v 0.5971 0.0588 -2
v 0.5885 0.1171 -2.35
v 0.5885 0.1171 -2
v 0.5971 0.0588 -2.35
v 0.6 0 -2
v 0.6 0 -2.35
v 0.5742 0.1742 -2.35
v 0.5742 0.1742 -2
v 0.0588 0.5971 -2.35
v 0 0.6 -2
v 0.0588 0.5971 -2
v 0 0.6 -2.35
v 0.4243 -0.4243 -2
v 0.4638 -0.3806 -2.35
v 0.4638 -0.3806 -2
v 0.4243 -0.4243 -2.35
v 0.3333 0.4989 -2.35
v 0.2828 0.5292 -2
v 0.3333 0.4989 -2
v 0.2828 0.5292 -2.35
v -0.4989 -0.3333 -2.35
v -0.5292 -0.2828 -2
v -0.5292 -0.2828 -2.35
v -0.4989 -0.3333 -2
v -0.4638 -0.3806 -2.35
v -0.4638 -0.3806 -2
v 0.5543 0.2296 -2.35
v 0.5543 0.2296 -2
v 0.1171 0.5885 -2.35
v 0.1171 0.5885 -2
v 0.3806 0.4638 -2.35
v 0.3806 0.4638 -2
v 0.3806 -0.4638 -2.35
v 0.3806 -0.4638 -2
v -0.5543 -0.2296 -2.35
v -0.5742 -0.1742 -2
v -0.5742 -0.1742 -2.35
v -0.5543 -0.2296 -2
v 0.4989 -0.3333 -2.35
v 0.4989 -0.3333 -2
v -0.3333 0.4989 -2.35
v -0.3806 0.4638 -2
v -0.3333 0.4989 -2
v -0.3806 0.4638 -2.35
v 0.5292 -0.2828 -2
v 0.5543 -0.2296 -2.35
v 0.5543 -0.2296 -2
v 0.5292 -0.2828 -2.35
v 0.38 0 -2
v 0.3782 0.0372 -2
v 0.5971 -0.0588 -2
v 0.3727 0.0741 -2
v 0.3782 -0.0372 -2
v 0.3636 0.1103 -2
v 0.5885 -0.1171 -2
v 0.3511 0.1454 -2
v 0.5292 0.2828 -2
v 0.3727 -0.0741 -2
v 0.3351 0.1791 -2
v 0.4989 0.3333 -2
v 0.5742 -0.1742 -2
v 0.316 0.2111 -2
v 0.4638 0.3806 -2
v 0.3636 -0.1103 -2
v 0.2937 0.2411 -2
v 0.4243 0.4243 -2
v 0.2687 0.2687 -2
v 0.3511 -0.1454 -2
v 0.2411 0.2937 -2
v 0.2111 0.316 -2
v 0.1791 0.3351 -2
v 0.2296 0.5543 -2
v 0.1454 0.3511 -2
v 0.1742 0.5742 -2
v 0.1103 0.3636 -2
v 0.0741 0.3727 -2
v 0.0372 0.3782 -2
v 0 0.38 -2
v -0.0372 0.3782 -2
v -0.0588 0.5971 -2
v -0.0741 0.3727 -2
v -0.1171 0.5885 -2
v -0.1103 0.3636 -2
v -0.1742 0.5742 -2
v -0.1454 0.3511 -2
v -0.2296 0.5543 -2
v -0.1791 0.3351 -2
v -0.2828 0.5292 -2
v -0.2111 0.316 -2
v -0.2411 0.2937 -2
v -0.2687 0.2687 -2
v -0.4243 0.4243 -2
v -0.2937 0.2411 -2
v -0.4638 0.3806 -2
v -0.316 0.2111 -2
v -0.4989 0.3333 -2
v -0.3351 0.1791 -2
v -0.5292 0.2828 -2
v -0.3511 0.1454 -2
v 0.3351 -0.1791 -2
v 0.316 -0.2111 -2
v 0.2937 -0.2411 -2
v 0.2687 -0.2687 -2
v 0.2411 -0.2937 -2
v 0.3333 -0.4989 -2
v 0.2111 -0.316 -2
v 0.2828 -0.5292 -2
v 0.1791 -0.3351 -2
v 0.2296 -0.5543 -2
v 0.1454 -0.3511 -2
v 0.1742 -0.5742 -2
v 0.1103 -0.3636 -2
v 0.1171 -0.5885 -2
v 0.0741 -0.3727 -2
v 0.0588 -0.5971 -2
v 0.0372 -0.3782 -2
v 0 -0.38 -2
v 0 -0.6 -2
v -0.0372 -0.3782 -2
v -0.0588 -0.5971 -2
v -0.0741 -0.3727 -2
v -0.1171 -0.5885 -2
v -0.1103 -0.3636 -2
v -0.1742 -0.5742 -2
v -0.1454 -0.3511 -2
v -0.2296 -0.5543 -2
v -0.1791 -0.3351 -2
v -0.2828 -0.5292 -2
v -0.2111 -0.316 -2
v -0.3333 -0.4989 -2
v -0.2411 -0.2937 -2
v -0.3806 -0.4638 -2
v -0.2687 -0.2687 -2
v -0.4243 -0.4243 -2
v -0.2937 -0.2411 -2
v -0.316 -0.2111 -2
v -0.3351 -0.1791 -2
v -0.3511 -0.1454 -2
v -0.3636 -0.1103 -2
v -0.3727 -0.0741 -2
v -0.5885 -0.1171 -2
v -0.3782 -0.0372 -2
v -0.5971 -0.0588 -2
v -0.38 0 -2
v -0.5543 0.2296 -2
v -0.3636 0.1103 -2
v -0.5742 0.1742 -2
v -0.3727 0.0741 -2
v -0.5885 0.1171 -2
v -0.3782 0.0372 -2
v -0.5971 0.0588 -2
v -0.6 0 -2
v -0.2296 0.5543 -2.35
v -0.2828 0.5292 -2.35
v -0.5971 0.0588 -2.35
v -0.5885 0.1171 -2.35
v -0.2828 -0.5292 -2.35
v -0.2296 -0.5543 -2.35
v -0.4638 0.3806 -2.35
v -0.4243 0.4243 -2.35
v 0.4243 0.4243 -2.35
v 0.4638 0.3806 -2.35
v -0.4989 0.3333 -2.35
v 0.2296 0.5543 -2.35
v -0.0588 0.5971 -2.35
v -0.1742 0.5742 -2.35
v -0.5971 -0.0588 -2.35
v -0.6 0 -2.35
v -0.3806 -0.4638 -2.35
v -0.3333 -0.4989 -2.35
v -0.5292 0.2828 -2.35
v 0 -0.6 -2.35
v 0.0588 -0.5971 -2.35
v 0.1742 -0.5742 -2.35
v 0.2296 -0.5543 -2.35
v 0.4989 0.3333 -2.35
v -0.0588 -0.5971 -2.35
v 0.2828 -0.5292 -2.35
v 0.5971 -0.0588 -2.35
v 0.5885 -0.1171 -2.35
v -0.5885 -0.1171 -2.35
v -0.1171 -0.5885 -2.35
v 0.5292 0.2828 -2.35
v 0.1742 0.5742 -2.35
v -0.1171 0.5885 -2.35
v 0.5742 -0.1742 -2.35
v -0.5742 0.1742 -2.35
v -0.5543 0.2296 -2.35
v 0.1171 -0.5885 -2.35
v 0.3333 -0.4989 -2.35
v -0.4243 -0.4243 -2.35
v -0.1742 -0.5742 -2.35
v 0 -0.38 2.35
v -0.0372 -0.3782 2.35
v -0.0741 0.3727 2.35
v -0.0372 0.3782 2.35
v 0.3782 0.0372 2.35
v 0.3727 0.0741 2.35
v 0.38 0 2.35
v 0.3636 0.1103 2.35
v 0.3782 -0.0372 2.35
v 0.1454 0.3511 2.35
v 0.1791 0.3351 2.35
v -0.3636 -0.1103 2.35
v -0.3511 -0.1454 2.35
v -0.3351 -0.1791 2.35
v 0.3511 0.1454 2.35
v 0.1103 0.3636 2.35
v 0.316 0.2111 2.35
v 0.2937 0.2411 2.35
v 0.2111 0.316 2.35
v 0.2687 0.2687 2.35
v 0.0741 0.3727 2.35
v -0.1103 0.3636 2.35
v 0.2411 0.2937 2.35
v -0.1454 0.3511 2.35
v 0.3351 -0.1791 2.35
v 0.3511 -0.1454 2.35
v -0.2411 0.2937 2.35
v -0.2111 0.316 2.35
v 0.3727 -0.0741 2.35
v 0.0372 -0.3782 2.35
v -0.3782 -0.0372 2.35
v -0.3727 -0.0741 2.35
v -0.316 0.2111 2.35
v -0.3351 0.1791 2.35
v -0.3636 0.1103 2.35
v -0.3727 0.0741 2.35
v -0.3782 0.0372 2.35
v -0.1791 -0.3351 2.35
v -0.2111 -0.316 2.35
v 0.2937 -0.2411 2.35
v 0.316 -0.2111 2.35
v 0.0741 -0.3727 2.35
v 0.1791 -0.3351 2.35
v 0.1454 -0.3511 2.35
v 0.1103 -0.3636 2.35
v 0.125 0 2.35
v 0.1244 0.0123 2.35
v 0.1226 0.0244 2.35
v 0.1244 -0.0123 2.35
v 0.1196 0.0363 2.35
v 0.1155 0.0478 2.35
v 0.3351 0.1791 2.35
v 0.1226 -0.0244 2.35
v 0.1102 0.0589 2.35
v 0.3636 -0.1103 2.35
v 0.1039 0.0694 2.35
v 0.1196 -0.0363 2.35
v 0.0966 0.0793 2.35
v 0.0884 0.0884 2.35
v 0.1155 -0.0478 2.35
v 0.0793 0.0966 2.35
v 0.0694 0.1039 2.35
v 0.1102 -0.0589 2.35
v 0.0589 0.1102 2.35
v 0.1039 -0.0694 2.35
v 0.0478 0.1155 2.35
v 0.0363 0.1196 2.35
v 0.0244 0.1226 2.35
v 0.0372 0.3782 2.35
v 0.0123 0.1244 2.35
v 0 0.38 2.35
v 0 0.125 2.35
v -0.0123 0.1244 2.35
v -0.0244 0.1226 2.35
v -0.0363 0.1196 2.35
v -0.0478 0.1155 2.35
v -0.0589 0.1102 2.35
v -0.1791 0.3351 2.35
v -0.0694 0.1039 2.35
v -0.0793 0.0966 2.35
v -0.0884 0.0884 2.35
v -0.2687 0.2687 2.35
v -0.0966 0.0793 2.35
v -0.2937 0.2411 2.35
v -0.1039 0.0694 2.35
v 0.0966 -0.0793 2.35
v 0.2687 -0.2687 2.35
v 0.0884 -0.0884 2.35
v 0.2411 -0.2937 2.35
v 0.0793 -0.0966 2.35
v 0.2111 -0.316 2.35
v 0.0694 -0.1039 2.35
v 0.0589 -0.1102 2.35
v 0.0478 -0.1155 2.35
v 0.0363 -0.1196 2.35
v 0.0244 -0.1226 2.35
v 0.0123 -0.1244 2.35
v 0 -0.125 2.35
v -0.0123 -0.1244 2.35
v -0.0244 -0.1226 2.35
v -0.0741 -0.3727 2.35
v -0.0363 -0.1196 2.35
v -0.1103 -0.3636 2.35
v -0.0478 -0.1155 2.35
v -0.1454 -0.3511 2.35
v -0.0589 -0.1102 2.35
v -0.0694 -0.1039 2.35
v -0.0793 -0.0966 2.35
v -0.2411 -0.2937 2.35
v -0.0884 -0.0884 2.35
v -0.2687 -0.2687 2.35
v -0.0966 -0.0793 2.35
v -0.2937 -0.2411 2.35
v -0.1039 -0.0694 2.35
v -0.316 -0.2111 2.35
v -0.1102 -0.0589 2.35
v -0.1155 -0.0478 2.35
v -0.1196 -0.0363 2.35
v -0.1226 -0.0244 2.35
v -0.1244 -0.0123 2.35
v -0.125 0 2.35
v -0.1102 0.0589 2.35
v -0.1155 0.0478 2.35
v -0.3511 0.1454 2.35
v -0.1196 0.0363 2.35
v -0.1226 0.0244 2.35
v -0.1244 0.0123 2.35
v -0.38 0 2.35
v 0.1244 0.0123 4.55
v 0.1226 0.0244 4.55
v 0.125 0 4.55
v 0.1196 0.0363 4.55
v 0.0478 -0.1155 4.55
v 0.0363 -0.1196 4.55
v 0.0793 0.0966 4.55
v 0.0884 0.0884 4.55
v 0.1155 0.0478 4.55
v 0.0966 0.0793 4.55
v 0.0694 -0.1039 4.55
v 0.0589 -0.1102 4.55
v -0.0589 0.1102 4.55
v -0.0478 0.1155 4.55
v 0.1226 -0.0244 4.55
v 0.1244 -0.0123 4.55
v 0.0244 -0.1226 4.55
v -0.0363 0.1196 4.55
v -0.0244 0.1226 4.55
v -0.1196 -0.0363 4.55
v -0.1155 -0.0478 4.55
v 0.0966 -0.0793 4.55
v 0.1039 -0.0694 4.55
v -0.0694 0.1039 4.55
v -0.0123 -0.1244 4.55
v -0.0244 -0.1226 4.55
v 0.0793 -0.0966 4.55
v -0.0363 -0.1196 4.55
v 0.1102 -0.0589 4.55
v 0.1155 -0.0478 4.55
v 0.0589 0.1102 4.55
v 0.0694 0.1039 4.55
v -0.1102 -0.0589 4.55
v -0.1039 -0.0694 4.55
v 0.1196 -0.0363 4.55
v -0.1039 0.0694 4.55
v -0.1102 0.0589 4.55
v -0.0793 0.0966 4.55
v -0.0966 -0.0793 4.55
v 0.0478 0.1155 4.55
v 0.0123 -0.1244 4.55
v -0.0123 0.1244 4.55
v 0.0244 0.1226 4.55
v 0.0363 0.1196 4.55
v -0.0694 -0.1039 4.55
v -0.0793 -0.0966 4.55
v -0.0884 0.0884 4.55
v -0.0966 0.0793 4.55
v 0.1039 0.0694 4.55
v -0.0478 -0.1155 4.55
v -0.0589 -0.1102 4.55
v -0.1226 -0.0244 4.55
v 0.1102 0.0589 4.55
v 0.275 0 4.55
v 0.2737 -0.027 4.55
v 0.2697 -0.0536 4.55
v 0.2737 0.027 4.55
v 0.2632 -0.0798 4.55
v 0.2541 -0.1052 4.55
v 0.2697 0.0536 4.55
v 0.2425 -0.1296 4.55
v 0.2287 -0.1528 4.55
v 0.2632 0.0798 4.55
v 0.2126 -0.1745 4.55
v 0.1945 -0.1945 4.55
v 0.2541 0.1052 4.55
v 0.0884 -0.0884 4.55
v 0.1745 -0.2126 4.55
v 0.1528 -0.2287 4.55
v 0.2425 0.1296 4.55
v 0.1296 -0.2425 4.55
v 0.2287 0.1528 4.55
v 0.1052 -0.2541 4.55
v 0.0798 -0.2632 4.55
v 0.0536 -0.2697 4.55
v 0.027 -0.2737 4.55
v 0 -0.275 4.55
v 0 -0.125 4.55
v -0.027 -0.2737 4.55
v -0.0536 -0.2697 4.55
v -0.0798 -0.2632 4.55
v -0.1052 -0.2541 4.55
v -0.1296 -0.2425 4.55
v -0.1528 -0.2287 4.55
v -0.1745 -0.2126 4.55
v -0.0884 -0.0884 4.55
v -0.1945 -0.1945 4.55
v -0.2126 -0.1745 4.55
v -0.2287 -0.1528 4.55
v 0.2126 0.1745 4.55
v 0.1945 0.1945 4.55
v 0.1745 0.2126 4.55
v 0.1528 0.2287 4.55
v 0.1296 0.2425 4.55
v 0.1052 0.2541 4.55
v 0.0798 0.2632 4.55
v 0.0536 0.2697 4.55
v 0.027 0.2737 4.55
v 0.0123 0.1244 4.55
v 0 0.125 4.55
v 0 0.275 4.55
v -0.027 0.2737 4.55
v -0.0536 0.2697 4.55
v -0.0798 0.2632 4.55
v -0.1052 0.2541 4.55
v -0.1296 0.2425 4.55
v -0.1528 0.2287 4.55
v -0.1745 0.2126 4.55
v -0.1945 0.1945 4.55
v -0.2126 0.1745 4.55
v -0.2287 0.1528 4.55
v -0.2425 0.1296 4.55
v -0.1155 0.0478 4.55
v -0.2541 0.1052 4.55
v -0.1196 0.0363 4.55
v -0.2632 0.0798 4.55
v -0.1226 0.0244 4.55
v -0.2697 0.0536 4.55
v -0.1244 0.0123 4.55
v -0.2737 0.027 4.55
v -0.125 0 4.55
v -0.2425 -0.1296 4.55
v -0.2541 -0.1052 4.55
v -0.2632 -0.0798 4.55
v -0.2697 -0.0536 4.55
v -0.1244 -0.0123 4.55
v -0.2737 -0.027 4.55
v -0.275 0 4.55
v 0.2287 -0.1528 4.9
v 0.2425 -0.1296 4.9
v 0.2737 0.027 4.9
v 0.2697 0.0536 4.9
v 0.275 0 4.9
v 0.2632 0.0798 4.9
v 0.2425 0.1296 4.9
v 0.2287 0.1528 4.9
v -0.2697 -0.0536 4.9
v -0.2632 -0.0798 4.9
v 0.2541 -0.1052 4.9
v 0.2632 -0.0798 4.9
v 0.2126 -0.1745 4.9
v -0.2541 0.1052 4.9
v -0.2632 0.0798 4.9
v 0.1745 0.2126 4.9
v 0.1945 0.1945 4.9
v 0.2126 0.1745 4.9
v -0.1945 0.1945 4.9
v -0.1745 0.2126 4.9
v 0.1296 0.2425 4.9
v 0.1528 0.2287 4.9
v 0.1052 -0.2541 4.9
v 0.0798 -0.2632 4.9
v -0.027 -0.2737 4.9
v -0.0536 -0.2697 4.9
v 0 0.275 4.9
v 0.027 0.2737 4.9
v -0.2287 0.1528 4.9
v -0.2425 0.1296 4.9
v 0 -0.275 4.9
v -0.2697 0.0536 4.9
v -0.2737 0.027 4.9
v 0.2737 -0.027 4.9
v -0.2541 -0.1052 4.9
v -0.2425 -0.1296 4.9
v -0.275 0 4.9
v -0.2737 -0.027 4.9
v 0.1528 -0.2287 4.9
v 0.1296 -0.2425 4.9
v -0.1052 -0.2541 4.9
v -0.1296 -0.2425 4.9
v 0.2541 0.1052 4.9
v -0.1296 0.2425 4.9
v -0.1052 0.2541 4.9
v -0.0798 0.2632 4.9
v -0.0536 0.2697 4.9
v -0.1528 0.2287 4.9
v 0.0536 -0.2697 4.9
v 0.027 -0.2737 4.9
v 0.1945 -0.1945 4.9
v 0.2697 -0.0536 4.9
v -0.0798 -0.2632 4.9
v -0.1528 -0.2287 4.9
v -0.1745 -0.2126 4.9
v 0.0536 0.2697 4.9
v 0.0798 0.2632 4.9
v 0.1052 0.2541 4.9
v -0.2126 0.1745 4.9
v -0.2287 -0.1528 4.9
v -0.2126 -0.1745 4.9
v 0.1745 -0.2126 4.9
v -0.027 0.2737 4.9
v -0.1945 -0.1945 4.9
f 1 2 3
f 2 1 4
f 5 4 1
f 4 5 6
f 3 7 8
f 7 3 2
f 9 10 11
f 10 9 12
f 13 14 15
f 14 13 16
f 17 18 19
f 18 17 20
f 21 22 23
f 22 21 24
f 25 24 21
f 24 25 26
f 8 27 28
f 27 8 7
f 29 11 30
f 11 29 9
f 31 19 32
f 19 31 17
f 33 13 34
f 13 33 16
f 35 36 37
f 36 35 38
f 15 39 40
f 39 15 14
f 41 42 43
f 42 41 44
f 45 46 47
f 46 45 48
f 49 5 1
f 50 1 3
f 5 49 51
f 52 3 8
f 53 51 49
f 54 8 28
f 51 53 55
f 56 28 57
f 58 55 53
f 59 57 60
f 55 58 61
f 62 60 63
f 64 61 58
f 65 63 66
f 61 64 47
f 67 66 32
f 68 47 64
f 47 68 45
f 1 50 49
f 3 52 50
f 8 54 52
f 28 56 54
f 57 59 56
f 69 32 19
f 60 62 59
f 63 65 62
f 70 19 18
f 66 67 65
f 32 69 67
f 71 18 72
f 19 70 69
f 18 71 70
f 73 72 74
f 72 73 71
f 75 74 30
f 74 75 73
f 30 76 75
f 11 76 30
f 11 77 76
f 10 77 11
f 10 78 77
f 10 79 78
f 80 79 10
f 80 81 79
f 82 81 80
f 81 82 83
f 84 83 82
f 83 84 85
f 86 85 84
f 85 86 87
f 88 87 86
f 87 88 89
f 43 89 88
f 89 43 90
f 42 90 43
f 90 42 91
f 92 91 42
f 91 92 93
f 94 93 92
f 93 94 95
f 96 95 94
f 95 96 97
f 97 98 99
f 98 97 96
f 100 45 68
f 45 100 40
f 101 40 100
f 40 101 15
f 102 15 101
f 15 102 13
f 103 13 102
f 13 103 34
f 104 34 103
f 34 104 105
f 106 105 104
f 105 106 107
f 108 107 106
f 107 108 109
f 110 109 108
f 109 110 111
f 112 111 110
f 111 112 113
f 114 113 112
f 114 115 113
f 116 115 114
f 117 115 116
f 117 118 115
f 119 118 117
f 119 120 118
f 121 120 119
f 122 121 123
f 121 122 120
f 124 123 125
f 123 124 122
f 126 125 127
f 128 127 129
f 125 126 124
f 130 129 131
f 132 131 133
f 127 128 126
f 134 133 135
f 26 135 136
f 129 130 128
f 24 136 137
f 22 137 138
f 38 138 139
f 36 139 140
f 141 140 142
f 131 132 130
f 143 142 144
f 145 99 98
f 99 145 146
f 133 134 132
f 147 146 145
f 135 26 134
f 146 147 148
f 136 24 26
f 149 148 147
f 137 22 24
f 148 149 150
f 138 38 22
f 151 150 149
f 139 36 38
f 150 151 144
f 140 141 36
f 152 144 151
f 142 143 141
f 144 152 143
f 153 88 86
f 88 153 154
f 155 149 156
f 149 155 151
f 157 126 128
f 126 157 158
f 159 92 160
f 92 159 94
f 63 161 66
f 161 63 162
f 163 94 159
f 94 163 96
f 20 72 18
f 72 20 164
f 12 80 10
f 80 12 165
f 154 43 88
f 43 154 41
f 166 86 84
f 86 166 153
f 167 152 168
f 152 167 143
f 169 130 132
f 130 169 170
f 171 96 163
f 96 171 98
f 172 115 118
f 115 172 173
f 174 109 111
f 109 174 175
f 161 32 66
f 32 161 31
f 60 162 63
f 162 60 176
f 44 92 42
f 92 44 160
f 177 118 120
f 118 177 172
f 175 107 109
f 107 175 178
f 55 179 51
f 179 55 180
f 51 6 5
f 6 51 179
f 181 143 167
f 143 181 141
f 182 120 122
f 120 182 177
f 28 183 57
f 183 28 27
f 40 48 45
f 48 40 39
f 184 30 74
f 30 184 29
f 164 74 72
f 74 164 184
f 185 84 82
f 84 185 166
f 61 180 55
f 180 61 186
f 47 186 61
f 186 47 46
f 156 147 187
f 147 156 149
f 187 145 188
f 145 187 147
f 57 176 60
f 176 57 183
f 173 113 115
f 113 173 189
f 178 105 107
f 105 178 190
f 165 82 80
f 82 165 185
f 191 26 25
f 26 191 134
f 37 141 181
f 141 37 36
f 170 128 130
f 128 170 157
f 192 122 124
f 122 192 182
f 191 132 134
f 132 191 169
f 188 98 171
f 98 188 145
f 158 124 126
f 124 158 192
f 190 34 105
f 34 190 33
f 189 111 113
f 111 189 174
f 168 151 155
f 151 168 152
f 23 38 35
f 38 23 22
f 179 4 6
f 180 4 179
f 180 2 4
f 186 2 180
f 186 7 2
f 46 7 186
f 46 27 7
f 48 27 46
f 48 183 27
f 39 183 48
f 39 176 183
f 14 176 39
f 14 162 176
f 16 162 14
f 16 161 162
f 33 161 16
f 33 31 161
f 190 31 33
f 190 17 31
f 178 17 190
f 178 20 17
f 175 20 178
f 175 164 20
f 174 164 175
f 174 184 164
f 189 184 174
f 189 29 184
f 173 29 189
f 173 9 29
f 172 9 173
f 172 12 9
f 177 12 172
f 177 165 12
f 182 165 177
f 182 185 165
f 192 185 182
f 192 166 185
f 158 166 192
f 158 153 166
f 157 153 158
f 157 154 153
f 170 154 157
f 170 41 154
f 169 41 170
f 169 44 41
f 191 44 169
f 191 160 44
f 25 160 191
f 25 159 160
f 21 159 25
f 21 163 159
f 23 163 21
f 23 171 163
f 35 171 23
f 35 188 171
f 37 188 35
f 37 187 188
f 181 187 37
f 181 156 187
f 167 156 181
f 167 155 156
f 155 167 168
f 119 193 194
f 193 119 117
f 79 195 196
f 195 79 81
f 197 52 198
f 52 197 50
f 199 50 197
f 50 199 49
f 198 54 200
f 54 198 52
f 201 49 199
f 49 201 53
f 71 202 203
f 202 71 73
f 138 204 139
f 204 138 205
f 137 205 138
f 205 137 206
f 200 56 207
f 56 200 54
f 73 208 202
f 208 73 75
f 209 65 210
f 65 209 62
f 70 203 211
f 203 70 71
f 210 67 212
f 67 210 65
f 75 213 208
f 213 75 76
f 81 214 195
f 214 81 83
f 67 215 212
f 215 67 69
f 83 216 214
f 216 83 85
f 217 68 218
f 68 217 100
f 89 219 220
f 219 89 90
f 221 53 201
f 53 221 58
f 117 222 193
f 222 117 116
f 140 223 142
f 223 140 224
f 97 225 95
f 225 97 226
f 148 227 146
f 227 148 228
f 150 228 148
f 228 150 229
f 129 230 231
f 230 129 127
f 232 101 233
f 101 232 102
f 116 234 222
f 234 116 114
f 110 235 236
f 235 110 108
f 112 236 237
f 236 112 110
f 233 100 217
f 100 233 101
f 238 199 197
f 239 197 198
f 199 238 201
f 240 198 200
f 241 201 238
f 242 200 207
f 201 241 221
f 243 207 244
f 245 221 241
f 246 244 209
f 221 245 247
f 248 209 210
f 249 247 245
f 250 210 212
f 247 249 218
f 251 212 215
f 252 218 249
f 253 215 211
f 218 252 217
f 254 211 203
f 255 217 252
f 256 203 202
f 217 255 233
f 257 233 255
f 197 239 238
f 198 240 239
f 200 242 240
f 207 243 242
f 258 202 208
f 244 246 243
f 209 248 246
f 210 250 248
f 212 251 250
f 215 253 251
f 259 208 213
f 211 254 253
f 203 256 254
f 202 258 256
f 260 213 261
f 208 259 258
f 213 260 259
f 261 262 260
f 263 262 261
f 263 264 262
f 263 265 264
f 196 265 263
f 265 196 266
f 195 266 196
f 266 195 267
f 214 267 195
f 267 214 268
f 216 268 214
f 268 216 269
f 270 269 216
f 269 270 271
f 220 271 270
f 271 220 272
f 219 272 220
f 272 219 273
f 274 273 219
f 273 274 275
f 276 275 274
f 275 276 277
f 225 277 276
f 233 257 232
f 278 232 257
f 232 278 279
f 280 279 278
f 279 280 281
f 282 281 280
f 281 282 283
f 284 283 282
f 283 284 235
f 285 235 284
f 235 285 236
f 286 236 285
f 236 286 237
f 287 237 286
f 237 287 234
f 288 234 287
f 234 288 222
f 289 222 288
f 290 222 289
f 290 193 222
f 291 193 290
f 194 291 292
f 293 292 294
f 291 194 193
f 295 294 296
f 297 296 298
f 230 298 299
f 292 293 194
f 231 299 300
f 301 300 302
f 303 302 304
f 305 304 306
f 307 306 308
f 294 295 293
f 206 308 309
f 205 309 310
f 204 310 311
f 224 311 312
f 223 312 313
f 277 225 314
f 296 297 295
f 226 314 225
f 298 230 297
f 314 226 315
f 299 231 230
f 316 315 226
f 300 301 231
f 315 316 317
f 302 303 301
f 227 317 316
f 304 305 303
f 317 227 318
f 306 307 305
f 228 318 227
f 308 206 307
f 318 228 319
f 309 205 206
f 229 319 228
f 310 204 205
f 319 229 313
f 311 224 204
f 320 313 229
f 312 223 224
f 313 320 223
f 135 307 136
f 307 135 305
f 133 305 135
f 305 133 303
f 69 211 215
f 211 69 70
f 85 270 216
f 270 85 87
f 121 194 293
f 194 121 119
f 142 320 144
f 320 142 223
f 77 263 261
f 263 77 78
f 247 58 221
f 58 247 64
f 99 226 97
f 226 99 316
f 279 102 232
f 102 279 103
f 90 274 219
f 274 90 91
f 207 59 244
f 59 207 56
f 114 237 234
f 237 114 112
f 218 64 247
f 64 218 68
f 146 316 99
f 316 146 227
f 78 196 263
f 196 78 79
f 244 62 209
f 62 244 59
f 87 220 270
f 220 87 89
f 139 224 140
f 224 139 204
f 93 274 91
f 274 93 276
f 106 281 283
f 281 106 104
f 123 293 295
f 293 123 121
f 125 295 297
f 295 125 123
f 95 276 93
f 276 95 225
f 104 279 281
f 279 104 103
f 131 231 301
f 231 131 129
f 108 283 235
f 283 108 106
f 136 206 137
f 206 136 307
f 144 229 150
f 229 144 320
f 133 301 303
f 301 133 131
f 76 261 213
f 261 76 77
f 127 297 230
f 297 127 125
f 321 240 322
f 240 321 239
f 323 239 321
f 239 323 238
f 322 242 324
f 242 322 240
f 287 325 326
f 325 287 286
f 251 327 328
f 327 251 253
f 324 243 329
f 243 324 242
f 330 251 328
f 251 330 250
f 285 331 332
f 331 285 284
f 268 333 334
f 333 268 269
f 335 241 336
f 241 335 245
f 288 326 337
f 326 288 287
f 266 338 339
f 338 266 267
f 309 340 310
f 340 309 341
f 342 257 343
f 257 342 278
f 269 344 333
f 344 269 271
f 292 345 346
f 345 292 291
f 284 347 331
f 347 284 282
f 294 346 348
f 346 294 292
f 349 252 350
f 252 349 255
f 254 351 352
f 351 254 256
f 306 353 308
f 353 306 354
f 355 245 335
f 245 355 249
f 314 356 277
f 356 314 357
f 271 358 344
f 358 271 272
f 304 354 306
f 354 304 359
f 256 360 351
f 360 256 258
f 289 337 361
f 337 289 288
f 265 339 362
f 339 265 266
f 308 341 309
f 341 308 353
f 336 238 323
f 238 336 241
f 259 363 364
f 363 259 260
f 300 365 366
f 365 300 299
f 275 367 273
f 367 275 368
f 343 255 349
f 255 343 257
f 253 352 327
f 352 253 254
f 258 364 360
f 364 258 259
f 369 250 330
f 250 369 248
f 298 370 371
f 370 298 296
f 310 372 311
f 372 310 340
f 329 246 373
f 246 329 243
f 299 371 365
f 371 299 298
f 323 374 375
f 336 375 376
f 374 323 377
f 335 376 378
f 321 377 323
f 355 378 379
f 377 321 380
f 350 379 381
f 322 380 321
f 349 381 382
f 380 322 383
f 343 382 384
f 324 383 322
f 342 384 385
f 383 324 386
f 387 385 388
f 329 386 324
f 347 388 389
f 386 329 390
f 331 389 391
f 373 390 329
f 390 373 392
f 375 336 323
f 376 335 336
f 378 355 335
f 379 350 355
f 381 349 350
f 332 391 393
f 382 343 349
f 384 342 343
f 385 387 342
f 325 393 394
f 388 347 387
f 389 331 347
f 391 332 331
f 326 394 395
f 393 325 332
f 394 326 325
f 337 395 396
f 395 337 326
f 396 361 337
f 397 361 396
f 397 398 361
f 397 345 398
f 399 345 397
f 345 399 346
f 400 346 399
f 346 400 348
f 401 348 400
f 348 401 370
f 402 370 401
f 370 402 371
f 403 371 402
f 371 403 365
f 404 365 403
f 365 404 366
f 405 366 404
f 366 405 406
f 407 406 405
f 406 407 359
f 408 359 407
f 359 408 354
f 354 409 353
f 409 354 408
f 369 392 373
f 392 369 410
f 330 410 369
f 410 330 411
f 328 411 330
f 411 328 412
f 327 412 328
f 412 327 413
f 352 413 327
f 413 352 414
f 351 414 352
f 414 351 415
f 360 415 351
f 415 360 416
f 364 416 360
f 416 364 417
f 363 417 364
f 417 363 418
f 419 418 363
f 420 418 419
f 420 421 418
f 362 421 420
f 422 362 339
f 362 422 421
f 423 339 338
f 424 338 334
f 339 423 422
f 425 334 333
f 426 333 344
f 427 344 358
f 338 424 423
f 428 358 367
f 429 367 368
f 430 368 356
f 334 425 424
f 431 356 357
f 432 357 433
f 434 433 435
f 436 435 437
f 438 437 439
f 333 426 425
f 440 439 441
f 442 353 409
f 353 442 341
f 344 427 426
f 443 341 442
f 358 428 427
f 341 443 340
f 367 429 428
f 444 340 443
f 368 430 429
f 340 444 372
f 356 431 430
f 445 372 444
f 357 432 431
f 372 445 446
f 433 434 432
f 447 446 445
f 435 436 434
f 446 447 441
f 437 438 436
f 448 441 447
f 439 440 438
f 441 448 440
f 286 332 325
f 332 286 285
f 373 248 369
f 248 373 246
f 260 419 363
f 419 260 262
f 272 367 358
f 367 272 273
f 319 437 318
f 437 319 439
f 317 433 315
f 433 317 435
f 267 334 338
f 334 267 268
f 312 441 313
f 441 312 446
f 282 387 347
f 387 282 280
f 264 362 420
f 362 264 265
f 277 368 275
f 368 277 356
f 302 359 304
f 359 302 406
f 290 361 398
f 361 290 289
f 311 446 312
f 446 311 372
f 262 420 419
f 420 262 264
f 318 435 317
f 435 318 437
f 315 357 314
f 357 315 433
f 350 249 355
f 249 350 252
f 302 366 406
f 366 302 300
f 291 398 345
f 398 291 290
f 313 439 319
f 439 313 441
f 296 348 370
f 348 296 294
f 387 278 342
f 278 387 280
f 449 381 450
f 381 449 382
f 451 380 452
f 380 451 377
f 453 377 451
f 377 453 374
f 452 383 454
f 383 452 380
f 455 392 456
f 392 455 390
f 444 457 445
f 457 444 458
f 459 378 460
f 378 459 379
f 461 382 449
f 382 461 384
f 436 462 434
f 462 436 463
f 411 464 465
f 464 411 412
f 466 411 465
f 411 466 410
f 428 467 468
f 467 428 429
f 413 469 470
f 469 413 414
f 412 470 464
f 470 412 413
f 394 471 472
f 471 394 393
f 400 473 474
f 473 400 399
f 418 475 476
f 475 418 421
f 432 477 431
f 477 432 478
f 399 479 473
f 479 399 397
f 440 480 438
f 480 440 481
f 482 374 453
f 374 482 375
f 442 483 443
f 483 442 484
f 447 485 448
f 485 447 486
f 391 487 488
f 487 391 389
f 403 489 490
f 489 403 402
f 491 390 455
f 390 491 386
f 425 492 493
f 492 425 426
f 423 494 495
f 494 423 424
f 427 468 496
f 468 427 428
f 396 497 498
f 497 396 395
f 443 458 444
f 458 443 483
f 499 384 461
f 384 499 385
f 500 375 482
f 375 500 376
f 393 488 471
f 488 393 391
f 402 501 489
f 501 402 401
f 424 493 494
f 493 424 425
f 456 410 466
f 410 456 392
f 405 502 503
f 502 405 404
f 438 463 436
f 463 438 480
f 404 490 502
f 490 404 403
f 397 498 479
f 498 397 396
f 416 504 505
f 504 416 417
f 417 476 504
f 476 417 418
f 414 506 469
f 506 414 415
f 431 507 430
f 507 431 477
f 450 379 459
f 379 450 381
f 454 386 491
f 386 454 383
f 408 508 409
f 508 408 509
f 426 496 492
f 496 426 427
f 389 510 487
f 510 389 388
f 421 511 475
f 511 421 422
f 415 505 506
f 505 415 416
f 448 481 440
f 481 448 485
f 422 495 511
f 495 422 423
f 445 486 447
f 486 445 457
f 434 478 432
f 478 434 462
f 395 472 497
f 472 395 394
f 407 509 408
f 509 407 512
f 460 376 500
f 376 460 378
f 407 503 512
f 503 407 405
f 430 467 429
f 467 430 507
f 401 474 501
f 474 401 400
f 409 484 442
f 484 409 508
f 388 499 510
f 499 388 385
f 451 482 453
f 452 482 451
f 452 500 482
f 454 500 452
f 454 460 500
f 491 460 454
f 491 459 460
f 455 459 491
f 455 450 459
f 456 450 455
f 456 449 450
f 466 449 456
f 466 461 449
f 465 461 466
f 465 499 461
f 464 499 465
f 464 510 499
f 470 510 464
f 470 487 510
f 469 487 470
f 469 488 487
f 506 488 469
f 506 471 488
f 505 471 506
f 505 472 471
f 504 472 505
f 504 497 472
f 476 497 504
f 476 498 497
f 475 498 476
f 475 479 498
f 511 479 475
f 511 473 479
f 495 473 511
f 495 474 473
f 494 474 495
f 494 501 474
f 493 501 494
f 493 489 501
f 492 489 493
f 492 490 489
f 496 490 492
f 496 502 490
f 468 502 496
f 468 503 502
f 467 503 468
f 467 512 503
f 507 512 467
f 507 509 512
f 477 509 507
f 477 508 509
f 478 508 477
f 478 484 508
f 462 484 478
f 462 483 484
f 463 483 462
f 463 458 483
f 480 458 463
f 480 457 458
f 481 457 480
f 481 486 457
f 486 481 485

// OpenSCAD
$fn=64;

body_d = 0.76;
body_r = body_d/2;
body_h = 4.7;

lever_d = 0.25;
lever_r = lever_d/2;
lever_h = 2.2;

cap_d = 0.55;
cap_r = cap_d/2;
cap_h = 0.35;

base_d = 1.2;
base_r = base_d/2;
base_h = 0.35;

module toggle_switch() {
    union() {
        translate([0,0,-body_h/2 + base_h/2])
            cylinder(h=base_h, r=base_r, center=true);

        cylinder(h=body_h, r=body_r, center=true);

        translate([0,0,body_h/2 + lever_h/2])
            cylinder(h=lever_h, r=lever_r, center=true);

        translate([0,0,body_h/2 + lever_h + cap_h/2])
            cylinder(h=cap_h, r=cap_r, center=true);
    }
}

toggle_switch();
